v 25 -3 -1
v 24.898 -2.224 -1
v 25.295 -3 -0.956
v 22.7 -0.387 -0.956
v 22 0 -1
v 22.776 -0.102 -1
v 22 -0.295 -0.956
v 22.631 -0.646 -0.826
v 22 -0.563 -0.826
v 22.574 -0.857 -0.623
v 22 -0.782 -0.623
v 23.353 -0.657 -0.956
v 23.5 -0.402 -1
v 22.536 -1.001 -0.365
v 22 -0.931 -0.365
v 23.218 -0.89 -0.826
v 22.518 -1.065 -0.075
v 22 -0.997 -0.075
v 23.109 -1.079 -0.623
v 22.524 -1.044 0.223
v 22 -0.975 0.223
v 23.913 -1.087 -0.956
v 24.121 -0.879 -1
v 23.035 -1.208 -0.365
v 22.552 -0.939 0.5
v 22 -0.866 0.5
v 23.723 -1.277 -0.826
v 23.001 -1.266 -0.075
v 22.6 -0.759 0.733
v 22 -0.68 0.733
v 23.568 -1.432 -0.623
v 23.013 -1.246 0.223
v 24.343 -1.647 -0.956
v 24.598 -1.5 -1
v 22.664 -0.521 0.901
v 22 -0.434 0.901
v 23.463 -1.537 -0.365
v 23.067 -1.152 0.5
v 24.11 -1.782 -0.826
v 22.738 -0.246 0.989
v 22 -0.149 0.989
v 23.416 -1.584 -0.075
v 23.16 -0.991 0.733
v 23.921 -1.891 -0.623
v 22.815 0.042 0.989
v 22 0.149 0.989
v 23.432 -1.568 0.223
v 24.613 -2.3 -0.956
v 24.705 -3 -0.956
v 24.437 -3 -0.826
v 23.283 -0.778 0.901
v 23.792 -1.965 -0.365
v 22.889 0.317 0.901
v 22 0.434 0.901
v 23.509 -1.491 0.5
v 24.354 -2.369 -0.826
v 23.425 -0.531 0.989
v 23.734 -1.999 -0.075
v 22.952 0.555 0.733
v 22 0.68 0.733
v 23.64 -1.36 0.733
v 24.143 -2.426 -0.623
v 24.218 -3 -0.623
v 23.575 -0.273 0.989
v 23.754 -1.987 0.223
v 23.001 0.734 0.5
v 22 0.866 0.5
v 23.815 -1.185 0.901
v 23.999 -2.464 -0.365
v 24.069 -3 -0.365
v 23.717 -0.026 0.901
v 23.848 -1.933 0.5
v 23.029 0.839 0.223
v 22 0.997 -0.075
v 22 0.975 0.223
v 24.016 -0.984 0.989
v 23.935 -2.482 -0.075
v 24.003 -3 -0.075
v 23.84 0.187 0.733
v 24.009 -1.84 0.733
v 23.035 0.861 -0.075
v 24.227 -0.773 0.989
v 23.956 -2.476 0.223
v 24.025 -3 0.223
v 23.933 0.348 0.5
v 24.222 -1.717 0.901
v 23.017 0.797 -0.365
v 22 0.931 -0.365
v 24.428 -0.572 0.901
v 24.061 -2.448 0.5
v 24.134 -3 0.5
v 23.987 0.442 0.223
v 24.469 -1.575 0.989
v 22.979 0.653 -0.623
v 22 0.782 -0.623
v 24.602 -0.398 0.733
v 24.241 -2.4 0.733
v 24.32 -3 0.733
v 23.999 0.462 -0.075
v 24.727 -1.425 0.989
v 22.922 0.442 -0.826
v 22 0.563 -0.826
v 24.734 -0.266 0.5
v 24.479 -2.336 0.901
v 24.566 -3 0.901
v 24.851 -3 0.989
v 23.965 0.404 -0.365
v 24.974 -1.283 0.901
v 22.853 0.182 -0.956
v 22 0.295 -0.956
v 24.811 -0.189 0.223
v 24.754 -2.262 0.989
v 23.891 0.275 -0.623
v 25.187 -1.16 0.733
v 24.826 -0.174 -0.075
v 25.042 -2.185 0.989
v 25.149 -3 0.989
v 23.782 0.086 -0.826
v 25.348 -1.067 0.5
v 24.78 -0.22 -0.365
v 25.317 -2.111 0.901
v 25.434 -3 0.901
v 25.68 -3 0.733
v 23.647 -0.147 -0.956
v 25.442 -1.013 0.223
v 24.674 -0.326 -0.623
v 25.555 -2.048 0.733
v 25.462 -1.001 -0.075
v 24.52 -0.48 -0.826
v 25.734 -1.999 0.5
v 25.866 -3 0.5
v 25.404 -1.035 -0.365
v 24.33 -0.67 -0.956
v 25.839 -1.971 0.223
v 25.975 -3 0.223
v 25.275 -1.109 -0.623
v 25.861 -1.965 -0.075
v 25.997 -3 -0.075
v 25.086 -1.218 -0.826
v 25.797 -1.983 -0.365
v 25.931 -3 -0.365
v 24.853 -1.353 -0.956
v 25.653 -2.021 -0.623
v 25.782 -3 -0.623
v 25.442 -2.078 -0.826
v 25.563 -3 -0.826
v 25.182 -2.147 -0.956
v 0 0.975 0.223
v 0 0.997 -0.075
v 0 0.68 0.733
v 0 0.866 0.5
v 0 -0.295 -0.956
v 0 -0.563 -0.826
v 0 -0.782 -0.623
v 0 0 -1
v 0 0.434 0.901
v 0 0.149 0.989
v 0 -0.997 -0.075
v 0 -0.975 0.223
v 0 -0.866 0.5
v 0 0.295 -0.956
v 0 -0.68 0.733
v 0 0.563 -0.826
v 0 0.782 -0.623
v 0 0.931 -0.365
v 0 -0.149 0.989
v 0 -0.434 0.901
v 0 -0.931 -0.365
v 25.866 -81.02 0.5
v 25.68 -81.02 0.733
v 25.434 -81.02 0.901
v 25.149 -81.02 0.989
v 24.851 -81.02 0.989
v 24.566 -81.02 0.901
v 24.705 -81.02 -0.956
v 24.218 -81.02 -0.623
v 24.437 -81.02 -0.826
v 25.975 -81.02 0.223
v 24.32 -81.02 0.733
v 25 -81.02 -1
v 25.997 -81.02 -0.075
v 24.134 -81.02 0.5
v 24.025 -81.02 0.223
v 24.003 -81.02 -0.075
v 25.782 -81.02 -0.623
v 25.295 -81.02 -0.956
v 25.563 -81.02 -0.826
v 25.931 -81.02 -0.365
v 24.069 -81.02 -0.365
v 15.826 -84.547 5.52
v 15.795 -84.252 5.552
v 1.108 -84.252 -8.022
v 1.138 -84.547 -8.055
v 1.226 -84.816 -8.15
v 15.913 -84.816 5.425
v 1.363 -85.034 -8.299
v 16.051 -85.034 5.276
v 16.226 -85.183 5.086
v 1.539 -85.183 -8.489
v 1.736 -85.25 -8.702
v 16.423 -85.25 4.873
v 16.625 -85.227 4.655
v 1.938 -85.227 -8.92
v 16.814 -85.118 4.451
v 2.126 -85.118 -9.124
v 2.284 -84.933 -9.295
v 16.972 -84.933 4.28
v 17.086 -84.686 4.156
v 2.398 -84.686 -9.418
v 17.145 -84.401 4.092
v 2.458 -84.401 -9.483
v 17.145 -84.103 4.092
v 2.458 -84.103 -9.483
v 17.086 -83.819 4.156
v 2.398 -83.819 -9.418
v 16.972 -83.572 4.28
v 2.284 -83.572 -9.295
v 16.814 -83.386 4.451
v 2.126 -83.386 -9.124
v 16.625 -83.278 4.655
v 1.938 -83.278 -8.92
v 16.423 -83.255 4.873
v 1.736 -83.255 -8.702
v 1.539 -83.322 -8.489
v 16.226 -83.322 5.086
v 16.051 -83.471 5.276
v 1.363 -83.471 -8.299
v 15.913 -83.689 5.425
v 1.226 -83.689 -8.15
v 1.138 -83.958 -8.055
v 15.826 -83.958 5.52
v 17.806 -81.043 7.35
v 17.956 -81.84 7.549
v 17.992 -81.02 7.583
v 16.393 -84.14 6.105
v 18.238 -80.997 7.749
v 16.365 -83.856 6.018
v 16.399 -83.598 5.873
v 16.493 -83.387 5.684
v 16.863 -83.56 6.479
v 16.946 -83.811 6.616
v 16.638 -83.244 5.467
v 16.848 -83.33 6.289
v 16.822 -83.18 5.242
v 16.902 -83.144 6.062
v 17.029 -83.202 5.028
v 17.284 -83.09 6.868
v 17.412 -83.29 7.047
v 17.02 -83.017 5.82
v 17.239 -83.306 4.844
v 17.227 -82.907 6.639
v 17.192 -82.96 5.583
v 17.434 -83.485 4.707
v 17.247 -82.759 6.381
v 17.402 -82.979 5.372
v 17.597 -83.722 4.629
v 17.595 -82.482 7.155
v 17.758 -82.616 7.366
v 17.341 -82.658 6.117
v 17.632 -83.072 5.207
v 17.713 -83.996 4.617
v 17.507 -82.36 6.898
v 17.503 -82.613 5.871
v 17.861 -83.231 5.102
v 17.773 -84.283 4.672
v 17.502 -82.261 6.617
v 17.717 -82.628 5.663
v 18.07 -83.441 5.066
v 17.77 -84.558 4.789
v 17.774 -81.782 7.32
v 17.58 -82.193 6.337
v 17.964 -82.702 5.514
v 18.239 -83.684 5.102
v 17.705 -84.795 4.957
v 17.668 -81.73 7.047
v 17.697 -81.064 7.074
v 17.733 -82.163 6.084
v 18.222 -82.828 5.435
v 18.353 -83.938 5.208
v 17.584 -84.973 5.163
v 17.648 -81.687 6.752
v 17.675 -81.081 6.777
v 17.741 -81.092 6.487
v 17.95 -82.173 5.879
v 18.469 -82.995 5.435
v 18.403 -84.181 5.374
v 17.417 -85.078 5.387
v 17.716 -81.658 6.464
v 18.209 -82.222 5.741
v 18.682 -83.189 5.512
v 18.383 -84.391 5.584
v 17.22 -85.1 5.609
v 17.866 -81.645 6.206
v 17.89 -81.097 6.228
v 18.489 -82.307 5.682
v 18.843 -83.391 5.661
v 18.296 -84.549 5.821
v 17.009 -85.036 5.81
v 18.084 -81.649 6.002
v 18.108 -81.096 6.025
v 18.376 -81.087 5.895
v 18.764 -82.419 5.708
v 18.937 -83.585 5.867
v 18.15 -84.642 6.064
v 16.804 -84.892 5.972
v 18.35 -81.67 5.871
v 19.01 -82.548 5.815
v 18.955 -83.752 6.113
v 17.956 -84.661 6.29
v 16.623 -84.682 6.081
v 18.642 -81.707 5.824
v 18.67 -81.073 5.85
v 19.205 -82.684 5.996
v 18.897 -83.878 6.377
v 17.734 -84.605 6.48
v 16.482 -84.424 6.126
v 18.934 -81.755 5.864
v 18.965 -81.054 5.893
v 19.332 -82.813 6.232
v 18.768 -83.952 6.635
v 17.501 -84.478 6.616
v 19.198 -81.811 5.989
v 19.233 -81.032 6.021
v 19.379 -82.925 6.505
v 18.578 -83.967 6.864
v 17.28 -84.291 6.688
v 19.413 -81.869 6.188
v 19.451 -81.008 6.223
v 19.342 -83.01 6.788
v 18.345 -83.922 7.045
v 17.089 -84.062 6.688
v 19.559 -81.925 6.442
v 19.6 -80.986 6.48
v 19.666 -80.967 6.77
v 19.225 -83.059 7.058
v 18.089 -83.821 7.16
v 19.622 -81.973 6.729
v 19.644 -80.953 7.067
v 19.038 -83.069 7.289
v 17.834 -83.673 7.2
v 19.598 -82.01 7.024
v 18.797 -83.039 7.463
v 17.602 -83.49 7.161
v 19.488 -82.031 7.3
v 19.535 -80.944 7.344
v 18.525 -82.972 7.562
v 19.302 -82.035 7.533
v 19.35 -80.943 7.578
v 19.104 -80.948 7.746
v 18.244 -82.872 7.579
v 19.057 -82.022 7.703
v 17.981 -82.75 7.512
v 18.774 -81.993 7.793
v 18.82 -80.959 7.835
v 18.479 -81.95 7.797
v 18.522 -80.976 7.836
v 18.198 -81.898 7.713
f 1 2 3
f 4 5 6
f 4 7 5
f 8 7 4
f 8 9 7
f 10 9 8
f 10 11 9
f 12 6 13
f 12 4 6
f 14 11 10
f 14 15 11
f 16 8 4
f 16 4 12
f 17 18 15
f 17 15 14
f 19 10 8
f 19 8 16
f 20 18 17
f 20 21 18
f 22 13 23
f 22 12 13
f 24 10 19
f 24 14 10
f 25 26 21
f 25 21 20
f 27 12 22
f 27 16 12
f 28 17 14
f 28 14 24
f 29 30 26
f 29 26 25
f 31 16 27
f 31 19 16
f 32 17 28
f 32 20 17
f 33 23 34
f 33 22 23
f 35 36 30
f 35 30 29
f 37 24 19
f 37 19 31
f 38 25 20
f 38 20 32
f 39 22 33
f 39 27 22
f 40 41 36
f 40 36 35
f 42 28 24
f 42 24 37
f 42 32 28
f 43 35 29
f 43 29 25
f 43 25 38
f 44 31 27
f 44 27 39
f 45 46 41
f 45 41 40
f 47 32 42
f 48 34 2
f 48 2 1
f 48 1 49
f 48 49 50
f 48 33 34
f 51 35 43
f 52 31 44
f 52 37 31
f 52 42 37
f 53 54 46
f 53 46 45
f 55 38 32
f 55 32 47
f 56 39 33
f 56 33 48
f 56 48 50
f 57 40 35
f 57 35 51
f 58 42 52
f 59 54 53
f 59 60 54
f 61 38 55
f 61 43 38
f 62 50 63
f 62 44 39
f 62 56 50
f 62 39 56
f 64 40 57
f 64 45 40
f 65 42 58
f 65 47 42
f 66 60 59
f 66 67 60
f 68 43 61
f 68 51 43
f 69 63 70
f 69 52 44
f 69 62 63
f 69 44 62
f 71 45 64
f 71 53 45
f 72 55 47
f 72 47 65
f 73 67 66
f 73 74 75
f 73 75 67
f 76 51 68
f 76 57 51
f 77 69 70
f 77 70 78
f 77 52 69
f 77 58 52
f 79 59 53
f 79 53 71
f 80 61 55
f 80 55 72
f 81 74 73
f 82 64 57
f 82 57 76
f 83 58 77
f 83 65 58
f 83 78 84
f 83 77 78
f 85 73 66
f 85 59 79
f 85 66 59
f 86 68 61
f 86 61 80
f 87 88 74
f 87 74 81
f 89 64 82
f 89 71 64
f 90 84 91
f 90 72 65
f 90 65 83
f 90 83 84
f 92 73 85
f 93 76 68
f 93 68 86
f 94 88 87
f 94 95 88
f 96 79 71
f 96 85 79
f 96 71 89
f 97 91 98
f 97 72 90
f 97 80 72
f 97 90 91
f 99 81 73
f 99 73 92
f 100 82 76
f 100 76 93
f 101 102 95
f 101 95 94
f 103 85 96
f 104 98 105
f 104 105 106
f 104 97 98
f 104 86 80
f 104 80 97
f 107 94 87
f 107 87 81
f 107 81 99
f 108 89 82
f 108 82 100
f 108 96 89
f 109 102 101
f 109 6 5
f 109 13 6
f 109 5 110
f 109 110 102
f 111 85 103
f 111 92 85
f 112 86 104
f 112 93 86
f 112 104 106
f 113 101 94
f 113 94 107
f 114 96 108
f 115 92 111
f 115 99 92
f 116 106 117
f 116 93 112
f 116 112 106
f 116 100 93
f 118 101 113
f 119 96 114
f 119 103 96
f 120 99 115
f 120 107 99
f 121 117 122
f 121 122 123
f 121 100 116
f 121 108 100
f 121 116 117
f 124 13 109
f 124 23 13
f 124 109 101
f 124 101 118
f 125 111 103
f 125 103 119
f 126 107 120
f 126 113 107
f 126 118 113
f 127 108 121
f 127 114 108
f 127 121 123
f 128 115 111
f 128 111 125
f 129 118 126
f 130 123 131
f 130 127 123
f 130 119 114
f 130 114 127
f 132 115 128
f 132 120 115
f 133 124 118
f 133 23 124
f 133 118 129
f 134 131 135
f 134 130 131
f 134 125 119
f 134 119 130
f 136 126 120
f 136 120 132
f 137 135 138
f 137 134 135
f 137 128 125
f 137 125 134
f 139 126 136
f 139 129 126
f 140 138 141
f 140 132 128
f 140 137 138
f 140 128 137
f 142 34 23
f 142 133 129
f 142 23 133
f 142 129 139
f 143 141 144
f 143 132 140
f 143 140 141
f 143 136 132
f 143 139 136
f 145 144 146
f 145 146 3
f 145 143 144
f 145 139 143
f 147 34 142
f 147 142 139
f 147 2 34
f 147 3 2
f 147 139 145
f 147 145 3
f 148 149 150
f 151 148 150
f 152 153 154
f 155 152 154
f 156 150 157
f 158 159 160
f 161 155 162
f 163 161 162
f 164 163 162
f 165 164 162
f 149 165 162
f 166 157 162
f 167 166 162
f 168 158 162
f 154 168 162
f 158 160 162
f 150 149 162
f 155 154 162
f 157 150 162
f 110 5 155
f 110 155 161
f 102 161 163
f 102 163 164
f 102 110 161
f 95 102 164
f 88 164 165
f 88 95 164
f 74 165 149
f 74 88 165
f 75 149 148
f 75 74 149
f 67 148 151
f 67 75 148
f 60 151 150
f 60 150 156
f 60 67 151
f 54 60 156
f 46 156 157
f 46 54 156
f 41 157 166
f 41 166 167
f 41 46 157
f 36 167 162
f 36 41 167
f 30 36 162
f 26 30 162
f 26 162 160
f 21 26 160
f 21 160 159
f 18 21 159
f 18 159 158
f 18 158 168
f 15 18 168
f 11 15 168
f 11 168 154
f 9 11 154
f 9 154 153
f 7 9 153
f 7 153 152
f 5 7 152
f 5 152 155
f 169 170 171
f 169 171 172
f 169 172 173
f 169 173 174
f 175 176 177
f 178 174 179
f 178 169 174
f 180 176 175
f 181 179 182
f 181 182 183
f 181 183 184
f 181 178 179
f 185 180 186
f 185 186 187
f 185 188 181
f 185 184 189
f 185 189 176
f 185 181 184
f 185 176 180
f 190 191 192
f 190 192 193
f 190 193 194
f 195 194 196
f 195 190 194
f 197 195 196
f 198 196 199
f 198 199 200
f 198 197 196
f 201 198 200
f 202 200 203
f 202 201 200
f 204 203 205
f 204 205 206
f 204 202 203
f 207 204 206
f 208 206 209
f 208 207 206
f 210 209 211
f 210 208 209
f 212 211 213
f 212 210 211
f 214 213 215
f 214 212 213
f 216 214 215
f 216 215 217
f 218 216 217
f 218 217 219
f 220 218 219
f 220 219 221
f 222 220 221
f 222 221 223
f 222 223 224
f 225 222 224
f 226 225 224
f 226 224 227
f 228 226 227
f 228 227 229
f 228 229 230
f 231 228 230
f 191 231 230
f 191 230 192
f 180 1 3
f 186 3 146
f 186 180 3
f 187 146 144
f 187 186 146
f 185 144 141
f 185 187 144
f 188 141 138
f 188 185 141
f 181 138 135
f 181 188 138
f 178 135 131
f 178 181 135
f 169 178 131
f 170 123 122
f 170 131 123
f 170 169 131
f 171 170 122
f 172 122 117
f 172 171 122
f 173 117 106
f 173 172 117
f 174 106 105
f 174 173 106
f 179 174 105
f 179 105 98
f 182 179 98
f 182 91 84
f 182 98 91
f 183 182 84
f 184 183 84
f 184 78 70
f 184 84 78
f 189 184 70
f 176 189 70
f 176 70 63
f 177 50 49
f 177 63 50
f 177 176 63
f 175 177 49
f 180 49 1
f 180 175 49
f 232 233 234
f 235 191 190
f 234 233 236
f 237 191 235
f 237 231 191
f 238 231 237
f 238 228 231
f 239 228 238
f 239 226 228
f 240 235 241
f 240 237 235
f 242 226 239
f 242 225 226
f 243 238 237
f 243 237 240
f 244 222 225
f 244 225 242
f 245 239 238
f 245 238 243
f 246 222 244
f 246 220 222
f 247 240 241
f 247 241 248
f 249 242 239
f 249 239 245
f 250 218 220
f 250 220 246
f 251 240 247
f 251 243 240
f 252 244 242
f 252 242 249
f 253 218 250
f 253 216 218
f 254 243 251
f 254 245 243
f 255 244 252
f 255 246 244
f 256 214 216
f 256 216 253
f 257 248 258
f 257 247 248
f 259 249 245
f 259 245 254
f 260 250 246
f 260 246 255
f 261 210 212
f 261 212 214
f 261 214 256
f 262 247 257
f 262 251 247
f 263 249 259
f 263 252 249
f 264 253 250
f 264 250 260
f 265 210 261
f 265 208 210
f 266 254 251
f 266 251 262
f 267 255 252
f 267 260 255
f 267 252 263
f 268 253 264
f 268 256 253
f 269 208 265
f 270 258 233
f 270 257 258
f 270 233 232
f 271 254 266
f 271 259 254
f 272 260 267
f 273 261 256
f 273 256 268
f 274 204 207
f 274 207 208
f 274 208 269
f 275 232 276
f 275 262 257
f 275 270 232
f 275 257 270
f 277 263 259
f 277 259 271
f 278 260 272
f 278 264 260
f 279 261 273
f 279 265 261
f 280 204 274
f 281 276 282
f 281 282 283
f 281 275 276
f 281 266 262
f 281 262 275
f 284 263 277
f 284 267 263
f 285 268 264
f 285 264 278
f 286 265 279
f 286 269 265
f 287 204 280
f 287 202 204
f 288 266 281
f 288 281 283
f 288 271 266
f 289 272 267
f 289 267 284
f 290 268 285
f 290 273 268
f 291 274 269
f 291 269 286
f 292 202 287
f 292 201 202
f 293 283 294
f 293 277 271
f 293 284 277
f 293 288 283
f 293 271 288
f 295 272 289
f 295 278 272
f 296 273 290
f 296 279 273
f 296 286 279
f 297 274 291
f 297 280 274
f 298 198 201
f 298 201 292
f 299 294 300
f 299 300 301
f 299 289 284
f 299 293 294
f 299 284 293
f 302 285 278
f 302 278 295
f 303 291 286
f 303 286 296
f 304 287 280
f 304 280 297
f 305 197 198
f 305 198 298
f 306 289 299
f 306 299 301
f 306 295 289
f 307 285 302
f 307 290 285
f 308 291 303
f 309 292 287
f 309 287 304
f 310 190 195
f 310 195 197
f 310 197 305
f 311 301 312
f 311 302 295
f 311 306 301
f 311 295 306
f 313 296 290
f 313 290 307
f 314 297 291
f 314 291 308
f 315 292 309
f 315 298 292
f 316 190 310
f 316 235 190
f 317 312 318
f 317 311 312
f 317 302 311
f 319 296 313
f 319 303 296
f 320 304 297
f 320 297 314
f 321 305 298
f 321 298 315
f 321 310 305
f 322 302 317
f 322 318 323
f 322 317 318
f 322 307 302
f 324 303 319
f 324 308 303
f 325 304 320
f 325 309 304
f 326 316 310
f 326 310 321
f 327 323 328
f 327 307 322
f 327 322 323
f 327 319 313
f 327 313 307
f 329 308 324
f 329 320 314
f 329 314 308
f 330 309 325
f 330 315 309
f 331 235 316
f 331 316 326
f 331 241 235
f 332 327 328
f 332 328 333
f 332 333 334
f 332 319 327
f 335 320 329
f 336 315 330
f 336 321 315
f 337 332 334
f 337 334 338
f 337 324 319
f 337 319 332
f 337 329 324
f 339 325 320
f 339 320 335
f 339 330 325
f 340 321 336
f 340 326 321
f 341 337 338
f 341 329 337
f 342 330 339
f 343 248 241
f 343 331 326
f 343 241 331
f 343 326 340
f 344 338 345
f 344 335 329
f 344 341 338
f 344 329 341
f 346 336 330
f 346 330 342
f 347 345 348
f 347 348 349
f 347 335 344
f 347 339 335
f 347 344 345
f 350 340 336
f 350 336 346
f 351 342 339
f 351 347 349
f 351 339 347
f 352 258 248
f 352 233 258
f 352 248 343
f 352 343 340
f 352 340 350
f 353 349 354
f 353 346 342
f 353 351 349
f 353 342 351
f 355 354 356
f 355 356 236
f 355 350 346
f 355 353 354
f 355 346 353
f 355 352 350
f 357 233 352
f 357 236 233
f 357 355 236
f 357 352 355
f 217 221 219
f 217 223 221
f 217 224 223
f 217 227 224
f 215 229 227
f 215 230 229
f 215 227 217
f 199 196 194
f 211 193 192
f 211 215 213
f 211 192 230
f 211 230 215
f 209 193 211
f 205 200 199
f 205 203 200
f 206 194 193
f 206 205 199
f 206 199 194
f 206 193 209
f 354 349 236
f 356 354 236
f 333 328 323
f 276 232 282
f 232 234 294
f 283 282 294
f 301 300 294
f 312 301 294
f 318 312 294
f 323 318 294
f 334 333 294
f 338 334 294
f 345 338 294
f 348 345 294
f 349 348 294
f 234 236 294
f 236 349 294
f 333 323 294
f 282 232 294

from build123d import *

# Parameters (mm, degrees)
SKETCH3_R = 1
SKETCH6_R = 1


with BuildPart() as part:
    # Sweep1: sweep along a path in Sketch1
    with BuildLine(Plane.XY) as sweep1_path:
        Line((0, 0), (22, 0))
        ThreePointArc((22, 0), (24.121320344, -0.878679656), (25, -3))
        Line((25, -3), (25, -81.02))
    # Sketch3 → Sweep1 (sweep)
    with BuildSketch(Plane(origin=(0, 0, 0), x_dir=(0, 0, -1), z_dir=(1, 0, 0))):
        Circle(SKETCH3_R)
    sweep(path=sweep1_path.line)


with BuildPart() as body_2:
    # Sweep3: sweep along a path in Sketch4
    with BuildLine(Plane(origin=(5.187924196, 0, -5.613163884), x_dir=(-0.7343767081251095, 0, -0.6787421090247221), z_dir=(0.6787421090247221, 0, -0.7343767081251095))) as sweep3_path:
        Line((4.63156326, -84.252449737), (-15.36843674, -84.252449737))
        ThreePointArc((-15.36843674, -84.252449737), (-17.570407359, -83.289929895), (-18.359417703, -81.02))
    # Sketch6 → Sweep3 (sweep)
    with BuildSketch(Plane(origin=(1.786612015, -84.252449737, -8.756800899), x_dir=(-0.6787421090247221, 0, 0.7343767081251096), z_dir=(-0.7343767081251096, 0, -0.6787421090247221))):
        Circle(SKETCH6_R)
    sweep(path=sweep3_path.line)


solid = Compound([part.part, body_2.part])
